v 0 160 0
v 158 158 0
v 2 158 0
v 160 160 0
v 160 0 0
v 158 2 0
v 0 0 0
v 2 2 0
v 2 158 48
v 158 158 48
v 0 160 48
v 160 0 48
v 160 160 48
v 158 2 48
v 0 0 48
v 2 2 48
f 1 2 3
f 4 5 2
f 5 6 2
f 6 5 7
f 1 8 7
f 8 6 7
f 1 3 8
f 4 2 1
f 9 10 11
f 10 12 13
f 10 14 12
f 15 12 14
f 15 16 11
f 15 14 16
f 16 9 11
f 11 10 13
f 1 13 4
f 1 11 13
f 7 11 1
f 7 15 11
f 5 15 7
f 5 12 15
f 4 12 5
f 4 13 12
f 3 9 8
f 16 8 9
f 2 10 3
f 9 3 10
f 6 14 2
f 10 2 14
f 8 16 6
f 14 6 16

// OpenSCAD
//### Max Build Volumes ###

// Prusa Mini = 180x180x180
// Prusa I3 MK3S = 250x210x210
// Creality Ender 3 V2 = 220x220x250

//### Customizer ###

boxWidth = 160;
boxLength = 160;
wallHeight = 50;
wallThickness = 2;
baseHeight = 4;
// Amount to lower the edge so the walls overlap the base
baseRabbet = 2;
// Change this to output base or walls
isBase = false;

//### Base ###

module makeBase() {
  // full base minus rabbet
  linear_extrude(height=(baseHeight-baseRabbet), center=false) {
    square([boxWidth, boxLength], center=false);
  }
  // rest of base, leaving space for walls overlapping rabbet
  translate([wallThickness, wallThickness, 0]) linear_extrude(height=baseHeight, center=false) {
    square([boxWidth-2*wallThickness, boxLength-2*wallThickness], center=false);
  }
}

//### Walls ###

module makeWalls() {
  linear_extrude(height=(wallHeight-baseRabbet), center=false) {
    difference() {
      // full box
      square([boxWidth, boxLength], center=false);
      // inner hole
      translate([wallThickness, wallThickness, 0]) square([boxWidth-2*wallThickness, boxLength-2*wallThickness], center=false);
    }
  }
}

//### Execute ###

if (isBase) {
  makeBase();
} else {
  makeWalls();
}
